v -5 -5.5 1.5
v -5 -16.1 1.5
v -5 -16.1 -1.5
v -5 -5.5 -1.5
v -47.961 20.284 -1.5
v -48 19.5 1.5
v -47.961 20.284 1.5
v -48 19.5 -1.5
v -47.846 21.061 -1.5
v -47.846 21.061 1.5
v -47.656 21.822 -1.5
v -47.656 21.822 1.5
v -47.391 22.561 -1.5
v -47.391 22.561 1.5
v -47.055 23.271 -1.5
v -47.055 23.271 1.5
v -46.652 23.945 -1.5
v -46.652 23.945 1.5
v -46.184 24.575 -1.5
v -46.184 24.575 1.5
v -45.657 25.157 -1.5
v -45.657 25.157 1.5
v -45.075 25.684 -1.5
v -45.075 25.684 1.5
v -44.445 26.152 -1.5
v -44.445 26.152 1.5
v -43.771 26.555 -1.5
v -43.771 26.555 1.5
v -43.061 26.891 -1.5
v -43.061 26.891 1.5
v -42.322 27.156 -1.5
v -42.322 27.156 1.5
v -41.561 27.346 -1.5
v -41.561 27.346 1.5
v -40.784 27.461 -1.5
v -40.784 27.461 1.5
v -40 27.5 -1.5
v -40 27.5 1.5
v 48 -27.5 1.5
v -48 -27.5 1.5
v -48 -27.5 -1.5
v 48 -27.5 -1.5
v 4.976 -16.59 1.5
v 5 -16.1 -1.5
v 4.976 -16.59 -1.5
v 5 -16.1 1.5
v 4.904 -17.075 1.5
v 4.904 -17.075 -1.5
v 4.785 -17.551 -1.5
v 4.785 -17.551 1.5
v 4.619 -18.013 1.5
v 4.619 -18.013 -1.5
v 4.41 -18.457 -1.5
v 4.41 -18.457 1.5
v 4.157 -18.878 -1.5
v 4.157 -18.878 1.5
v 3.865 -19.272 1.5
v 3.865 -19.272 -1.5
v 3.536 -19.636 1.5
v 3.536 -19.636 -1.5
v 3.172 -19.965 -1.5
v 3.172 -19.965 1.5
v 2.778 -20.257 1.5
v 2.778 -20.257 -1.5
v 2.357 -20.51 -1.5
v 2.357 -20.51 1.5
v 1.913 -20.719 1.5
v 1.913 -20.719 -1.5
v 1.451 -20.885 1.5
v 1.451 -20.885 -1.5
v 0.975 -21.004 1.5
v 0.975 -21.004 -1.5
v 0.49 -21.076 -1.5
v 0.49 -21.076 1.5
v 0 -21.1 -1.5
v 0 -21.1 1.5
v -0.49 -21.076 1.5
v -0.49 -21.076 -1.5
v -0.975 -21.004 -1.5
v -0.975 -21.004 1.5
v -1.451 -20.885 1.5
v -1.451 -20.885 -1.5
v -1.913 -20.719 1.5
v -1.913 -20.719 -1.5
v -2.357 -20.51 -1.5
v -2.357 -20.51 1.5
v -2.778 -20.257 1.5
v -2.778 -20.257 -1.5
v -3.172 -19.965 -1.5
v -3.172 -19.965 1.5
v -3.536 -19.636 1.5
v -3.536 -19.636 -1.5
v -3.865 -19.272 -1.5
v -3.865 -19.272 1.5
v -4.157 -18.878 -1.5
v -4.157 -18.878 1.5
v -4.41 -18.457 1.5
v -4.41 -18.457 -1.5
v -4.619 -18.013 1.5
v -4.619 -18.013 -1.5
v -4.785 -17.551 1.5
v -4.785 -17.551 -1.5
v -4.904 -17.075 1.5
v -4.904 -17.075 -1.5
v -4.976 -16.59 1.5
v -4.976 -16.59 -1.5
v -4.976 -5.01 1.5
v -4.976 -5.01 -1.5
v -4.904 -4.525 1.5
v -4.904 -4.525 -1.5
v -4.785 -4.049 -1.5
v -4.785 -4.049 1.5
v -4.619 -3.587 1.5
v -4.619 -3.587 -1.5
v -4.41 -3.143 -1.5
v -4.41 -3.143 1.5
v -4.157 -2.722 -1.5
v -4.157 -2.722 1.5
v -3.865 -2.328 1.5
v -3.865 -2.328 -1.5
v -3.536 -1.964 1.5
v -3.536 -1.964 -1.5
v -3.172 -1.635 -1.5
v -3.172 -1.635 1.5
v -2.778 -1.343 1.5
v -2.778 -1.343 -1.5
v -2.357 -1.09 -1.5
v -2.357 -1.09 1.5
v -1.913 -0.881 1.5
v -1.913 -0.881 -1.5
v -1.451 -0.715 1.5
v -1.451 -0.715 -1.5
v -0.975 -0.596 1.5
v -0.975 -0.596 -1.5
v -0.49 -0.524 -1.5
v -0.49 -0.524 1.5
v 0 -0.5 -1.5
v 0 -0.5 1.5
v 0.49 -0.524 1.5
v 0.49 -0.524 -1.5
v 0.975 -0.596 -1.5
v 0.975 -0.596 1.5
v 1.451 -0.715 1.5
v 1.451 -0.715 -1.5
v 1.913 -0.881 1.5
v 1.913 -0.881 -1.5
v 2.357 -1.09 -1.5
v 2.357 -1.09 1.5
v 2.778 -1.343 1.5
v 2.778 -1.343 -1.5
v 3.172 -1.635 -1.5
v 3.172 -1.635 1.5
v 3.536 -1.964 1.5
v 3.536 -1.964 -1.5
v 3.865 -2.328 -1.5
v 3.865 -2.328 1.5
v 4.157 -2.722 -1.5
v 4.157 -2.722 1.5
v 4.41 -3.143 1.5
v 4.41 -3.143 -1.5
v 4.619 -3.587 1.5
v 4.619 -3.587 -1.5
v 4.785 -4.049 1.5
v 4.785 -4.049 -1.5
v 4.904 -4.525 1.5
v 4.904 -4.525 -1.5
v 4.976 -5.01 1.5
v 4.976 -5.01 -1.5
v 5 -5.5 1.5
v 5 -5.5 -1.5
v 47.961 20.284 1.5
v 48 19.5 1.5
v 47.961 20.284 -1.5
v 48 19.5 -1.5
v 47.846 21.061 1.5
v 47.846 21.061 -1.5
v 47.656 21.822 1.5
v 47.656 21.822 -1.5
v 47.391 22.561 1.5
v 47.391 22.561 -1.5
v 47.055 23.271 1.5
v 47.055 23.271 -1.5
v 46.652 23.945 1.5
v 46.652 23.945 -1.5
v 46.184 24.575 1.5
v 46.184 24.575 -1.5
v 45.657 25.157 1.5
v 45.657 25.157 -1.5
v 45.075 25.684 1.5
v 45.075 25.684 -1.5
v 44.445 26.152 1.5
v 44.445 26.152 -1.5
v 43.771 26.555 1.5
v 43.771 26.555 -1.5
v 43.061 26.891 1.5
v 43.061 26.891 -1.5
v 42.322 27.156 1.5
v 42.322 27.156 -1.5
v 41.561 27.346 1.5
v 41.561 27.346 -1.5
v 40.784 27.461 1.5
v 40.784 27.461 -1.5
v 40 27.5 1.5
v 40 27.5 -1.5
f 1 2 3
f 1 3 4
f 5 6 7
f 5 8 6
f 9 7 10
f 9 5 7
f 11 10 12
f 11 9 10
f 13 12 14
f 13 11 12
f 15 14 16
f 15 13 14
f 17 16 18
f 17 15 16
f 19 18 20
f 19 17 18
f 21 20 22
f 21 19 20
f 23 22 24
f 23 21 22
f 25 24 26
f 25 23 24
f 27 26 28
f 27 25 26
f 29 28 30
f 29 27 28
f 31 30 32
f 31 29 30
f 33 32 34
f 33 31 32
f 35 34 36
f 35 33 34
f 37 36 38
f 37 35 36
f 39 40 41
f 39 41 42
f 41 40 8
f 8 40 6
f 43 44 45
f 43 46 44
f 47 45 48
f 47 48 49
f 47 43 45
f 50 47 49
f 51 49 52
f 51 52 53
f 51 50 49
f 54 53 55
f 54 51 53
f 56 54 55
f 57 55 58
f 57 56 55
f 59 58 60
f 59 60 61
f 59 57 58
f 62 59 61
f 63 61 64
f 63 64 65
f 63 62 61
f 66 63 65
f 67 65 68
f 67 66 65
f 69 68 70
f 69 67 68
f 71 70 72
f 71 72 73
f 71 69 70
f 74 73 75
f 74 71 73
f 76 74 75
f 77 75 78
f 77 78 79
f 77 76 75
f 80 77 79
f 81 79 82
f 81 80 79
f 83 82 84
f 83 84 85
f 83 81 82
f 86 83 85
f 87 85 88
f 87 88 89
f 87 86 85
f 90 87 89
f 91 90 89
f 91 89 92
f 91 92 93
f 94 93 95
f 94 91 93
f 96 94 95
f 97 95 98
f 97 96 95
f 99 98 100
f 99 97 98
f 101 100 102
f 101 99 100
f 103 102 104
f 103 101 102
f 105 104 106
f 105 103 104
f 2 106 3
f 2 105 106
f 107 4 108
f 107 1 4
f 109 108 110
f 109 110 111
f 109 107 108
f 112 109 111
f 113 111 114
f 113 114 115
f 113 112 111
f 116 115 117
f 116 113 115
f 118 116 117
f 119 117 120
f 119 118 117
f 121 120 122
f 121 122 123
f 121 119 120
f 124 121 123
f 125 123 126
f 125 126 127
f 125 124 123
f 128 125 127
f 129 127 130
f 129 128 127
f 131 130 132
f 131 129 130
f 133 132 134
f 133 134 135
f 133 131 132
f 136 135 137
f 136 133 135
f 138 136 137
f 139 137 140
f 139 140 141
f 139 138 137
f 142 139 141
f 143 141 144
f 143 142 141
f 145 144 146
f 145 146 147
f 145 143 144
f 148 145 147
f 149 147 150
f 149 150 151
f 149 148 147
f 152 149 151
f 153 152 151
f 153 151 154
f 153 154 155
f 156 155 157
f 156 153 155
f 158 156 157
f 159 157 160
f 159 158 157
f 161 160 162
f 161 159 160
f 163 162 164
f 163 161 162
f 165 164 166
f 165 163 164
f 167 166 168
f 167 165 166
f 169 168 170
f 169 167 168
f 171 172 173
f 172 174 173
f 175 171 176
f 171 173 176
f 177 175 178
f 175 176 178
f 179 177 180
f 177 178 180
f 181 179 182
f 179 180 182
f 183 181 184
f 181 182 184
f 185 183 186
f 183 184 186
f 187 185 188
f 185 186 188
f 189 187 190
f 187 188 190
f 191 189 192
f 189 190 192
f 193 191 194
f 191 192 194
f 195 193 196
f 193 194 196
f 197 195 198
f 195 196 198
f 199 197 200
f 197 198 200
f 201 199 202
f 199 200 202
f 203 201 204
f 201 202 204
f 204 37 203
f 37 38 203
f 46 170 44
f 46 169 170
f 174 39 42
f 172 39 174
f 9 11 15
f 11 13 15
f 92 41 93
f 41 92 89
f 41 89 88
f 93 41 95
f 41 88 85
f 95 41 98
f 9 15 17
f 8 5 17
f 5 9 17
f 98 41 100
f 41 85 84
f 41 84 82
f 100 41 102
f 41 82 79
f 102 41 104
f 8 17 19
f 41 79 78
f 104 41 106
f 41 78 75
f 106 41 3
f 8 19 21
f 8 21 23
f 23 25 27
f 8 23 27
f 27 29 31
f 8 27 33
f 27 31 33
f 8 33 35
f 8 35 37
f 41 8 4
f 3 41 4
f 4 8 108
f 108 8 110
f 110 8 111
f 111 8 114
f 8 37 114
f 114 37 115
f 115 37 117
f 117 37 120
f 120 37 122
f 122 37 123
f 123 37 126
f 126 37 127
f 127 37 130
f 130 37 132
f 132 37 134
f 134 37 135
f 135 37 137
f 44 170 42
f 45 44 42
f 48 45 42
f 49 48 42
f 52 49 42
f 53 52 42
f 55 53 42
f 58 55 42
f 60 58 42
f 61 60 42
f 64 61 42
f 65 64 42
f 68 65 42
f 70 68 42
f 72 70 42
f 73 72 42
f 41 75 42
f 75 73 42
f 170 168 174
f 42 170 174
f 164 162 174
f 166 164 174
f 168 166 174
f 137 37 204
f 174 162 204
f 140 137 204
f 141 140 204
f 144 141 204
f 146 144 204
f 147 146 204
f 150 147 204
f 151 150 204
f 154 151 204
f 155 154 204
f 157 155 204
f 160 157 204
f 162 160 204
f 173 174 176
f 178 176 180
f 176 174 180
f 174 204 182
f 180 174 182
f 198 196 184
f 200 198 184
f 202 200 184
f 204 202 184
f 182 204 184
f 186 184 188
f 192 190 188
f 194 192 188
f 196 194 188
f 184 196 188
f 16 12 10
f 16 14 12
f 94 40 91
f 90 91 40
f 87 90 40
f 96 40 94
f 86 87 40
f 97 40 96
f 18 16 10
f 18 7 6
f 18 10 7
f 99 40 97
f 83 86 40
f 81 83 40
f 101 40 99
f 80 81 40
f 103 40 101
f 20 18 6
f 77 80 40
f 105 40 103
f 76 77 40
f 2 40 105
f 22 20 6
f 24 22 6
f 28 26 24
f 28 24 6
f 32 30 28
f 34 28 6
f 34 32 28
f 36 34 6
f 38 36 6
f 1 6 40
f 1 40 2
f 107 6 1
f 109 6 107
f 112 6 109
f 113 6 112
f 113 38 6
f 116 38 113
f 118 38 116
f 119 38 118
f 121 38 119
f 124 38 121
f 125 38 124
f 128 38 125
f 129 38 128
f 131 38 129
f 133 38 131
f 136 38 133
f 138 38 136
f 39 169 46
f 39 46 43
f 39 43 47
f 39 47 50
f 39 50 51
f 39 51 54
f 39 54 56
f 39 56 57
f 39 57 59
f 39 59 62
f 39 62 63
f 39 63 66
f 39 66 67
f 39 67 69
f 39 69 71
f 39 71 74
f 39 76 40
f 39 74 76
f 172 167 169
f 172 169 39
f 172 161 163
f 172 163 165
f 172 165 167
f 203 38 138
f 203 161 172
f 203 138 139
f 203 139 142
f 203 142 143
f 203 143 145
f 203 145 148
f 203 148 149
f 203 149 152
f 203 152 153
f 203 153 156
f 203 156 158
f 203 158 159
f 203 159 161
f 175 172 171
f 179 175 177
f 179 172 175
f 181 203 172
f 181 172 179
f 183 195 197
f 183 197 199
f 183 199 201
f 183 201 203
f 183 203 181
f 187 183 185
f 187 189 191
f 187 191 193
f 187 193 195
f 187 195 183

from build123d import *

# Parameters (mm, degrees)
SKETCH1_W           = 96
SKETCH1_H           = 55
BOSS_EXTRUDE1_DEPTH = 1.5
FILLET1_R           = 8


with BuildPart() as part:
    # Sketch1 → Boss-Extrude1 (new, symmetric)
    with BuildSketch(Plane.XY):
        Rectangle(SKETCH1_W, SKETCH1_H)
        with BuildLine():
            Line((-5, -16.1), (-5, -5.5))
            ThreePointArc((-5, -5.5), (0, -0.5), (5, -5.5))
            Line((5, -5.5), (5, -16.1))
            ThreePointArc((5, -16.1), (0, -21.1), (-5, -16.1))
        make_face(mode=Mode.SUBTRACT)
    extrude(amount=BOSS_EXTRUDE1_DEPTH, both=True)

    # Fillet1
    fillet1_edges = [part.edges().sort_by_distance(p)[0] for p in [
        (-48, 27.5, 0),
        (48, 27.5, 0),
    ]]
    fillet(fillet1_edges, radius=FILLET1_R)


solid = part.part
